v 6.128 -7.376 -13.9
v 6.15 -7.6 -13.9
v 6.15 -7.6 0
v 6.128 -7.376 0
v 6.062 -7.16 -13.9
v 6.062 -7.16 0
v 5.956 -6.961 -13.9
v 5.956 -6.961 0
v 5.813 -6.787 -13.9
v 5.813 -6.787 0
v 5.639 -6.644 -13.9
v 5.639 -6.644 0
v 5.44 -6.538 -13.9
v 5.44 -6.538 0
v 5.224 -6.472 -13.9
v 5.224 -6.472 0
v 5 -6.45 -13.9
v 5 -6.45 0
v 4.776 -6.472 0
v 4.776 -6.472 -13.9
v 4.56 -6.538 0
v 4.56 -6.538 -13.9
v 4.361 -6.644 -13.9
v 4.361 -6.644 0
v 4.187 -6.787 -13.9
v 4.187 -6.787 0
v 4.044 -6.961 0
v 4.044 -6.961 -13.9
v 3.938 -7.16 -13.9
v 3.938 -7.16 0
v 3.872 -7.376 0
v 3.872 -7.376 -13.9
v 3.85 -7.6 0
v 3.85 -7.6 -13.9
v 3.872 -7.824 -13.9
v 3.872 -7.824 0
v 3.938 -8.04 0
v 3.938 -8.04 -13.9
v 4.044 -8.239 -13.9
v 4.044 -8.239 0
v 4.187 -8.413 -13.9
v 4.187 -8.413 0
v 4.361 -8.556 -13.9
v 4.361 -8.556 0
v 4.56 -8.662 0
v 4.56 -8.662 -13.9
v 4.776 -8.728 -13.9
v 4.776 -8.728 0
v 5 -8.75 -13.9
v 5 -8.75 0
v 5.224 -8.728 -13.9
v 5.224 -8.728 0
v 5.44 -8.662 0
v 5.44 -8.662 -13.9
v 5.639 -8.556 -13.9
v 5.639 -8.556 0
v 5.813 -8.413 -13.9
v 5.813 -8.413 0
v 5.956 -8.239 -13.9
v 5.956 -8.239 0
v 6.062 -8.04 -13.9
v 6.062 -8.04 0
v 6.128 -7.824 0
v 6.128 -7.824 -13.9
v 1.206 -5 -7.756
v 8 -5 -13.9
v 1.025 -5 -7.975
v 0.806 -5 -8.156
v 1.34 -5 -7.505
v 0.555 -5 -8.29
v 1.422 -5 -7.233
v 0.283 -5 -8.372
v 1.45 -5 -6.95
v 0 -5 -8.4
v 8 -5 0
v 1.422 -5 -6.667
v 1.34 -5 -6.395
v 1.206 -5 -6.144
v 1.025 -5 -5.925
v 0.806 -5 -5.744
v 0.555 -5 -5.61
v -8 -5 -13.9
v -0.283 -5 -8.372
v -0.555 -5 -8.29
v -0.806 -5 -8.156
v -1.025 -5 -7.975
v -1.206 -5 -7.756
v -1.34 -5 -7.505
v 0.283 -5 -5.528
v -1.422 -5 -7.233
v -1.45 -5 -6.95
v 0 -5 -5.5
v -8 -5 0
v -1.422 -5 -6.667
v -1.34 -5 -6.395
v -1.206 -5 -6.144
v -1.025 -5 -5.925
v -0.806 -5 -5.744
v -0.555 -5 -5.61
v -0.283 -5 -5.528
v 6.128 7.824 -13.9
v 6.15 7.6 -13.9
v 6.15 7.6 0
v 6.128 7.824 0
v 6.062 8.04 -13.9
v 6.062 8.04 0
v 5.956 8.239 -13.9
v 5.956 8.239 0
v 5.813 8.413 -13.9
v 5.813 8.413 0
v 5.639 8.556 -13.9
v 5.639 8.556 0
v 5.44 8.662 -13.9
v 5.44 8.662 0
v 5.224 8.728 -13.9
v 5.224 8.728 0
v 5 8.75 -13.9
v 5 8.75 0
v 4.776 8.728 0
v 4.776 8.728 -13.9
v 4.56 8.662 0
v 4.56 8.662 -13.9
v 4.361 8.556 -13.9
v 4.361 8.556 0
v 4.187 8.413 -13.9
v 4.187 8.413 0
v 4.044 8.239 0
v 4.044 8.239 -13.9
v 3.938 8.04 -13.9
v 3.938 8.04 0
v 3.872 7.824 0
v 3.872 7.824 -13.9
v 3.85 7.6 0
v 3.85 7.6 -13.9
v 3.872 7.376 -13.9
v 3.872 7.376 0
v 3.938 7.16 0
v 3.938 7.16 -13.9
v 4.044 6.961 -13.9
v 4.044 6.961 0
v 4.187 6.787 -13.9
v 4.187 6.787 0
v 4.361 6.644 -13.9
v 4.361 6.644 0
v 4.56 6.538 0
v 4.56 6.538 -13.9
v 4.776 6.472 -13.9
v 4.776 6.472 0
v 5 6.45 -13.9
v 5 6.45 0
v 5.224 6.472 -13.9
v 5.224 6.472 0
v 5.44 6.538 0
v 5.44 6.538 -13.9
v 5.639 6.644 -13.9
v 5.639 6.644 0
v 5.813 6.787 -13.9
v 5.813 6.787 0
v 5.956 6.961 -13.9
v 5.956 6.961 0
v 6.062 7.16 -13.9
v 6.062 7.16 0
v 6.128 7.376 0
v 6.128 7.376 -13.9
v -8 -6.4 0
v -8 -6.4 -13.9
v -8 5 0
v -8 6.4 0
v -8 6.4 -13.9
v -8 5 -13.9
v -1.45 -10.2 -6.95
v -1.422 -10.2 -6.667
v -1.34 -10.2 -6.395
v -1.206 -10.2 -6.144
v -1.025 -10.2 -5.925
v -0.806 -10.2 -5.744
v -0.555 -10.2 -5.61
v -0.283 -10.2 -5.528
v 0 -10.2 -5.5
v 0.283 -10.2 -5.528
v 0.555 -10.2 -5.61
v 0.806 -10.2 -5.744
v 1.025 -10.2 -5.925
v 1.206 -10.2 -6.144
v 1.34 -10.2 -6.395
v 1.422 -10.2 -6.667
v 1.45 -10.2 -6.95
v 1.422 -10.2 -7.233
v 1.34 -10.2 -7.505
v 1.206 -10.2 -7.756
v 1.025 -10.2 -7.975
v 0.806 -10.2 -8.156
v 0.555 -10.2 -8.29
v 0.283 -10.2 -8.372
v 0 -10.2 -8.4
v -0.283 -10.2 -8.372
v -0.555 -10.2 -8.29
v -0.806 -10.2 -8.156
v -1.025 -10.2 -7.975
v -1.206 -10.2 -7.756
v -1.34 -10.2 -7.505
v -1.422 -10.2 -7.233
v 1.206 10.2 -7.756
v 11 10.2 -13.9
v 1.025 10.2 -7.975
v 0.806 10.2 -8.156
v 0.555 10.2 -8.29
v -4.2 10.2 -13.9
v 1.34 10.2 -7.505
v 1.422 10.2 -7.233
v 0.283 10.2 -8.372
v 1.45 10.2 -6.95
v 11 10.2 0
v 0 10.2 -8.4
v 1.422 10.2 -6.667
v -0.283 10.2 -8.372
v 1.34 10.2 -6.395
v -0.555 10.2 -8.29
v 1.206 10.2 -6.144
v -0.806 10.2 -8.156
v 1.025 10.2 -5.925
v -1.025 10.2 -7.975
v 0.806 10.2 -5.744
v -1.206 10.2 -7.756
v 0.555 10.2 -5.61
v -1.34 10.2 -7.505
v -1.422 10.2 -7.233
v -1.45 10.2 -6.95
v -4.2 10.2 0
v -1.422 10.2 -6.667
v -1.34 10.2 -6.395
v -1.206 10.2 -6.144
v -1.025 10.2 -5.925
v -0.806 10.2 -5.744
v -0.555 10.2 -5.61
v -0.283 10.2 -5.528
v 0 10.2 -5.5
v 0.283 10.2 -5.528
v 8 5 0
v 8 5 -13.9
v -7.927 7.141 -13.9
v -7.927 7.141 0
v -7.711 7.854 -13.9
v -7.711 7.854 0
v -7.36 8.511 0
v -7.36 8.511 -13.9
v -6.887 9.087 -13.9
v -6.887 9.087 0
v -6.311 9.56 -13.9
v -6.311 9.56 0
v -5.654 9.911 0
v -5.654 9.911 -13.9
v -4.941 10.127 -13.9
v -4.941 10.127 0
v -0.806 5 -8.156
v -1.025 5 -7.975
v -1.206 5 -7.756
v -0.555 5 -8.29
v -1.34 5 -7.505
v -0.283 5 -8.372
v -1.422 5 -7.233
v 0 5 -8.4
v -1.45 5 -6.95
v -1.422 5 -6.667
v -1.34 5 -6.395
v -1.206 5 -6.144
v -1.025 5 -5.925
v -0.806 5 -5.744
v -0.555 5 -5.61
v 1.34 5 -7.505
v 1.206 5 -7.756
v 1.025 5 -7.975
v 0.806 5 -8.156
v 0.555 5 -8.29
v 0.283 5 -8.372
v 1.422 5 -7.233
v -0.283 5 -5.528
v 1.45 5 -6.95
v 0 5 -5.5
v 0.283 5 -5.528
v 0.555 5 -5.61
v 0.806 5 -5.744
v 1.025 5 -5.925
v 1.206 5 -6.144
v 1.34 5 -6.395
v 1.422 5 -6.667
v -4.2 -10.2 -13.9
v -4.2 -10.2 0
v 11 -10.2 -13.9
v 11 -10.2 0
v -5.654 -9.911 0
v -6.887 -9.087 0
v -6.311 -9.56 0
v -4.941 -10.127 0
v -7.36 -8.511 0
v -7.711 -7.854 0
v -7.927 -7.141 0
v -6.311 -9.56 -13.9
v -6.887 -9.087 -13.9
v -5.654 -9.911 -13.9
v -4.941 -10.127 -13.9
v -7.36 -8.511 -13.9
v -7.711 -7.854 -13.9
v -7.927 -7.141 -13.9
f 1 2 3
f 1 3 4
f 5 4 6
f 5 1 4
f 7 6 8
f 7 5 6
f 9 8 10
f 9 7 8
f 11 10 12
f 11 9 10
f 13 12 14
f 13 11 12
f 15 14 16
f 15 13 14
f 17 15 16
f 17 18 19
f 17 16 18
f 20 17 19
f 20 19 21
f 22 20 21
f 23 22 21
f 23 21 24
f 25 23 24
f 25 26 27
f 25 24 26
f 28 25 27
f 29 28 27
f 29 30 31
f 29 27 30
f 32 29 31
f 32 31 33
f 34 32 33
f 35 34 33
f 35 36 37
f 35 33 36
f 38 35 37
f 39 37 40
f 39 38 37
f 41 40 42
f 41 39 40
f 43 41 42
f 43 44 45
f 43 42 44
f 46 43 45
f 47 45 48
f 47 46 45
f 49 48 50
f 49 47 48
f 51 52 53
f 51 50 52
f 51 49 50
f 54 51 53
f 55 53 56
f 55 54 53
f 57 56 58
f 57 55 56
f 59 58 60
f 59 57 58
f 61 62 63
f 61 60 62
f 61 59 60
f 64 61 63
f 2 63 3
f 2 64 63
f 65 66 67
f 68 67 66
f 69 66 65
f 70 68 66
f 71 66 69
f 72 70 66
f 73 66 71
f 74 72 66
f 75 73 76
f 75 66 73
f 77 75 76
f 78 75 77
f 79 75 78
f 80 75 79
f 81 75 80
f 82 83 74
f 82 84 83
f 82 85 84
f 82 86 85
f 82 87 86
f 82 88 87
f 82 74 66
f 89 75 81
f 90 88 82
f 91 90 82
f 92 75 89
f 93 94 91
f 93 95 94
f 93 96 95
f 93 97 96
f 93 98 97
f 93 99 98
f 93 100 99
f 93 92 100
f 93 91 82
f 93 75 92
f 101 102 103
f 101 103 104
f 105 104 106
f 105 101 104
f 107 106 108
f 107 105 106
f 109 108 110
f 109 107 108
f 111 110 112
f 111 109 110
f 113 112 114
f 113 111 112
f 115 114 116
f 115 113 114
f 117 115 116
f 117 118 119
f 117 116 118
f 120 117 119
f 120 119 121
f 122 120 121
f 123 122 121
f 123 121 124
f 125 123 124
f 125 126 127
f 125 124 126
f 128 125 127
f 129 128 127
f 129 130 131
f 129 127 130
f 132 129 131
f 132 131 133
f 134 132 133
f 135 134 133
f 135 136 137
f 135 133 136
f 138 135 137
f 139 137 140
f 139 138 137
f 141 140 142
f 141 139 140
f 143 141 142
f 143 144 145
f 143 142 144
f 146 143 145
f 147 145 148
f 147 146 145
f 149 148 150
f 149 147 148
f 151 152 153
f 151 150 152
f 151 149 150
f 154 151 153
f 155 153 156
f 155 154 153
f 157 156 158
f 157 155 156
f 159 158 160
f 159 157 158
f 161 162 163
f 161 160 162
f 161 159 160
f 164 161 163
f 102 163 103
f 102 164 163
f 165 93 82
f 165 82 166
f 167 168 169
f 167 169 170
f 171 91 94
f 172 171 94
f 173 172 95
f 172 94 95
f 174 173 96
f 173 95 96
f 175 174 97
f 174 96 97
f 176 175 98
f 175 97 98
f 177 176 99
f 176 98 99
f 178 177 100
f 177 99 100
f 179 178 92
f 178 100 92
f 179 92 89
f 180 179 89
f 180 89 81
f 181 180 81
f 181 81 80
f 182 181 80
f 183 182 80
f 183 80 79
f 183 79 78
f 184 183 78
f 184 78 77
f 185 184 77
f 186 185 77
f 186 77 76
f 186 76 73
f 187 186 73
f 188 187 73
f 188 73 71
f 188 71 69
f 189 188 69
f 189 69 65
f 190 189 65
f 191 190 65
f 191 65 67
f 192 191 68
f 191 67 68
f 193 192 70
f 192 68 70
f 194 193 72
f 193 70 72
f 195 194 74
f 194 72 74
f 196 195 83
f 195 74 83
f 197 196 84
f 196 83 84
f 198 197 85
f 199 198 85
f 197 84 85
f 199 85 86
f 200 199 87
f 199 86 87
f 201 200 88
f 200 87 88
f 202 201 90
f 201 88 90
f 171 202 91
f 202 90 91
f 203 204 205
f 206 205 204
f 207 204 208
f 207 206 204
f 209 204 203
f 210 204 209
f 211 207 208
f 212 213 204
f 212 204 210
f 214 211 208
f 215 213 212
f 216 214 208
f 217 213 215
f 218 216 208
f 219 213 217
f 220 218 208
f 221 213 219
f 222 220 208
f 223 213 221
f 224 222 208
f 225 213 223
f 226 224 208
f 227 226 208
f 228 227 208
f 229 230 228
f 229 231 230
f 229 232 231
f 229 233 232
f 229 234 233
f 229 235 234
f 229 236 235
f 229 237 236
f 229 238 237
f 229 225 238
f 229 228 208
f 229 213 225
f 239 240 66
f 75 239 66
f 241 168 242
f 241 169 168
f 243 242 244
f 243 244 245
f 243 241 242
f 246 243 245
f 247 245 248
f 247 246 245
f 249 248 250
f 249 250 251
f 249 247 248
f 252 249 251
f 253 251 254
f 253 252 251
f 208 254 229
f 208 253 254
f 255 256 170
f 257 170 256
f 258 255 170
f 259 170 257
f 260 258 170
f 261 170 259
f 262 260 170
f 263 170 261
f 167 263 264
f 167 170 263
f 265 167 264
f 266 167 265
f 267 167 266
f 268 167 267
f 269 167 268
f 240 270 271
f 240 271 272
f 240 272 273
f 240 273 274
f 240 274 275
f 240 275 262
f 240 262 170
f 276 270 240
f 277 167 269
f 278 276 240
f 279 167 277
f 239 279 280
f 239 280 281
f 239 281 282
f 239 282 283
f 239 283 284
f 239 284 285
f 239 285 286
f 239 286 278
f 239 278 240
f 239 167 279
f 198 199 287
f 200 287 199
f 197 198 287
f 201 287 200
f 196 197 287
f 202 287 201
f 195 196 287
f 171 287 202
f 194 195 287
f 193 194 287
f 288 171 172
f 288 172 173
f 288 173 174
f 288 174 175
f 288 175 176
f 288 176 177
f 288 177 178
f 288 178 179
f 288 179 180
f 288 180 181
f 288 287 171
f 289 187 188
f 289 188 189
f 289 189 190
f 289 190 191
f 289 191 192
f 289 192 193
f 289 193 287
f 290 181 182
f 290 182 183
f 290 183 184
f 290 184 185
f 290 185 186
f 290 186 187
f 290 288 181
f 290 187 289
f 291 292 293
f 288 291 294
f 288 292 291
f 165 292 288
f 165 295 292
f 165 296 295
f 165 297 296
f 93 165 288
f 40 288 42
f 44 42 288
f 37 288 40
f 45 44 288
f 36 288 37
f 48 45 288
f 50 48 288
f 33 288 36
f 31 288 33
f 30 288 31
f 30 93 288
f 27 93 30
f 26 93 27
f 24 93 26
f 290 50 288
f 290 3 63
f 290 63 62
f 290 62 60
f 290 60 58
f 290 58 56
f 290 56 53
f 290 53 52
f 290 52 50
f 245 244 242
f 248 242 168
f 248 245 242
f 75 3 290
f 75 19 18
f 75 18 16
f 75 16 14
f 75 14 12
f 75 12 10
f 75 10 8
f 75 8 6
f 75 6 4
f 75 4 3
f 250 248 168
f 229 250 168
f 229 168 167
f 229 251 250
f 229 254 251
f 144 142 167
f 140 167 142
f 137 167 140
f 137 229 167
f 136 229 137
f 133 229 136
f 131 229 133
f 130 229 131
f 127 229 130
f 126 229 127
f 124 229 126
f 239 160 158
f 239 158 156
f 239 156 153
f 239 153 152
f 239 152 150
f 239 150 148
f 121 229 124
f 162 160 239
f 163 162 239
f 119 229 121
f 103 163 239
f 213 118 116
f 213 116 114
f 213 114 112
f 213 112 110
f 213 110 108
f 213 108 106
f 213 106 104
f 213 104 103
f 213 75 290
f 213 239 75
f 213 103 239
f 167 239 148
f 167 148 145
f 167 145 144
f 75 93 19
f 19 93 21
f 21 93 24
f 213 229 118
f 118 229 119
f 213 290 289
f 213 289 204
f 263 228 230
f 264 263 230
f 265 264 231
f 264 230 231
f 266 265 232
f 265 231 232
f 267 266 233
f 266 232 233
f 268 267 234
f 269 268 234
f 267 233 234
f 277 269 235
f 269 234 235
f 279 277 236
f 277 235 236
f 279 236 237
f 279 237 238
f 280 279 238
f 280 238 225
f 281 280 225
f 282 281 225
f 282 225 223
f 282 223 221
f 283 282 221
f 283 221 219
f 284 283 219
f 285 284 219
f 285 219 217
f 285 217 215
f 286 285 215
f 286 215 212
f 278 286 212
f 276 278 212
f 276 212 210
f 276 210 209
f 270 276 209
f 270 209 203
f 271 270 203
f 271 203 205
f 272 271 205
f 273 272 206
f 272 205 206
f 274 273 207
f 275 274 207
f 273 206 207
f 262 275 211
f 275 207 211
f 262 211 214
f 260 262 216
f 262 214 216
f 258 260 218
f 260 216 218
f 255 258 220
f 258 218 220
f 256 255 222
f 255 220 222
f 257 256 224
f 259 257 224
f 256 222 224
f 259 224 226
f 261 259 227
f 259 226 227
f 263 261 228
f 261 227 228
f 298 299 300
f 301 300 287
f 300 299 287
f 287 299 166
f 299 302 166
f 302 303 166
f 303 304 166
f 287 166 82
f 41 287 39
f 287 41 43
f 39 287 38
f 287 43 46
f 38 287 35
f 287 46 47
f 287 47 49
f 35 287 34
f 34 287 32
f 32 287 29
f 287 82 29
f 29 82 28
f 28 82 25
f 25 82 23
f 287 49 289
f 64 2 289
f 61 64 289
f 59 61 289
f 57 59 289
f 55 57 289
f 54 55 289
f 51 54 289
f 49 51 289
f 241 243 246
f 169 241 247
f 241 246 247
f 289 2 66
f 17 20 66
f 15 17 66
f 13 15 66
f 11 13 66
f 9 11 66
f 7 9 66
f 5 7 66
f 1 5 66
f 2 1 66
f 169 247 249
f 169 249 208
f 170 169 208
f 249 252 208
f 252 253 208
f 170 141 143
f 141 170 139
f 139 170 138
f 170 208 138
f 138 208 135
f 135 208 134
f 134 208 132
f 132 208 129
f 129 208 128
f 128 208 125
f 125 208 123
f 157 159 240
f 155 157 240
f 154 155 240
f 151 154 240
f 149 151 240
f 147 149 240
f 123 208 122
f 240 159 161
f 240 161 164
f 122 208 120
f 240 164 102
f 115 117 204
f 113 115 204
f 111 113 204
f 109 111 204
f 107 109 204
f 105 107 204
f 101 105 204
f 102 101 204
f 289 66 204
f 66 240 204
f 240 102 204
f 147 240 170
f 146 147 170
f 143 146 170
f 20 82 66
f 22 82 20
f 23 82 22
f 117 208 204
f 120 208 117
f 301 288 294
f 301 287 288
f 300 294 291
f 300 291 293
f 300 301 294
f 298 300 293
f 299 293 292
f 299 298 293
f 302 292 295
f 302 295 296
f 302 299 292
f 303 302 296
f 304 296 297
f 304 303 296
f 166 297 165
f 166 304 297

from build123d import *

# Parameters (mm, degrees)
BOSS_EXTRUDE2_DEPTH     = 13.9
CUT_EXTRUDE1_DEPTH      = 21.451161336
CUT_EXTRUDE1_DEPTH_BACK = 21.451161336
SKETCH2_R               = 1.15
SKETCH3_R               = 1.45
CUT_EXTRUDE2_DEPTH      = 28.025358462
FILLET1_R               = 3.8


with BuildPart() as part:
    # Sketch1 → Boss-Extrude2 (new body)
    with BuildSketch(Plane.XY):
        Polygon((-8, 10.2), (-8, 5), (8, 5), (8, -5), (-8, -5), (-8, -10.2), (11, -10.2), (11, 10.2), align=None)
    extrude(amount=-BOSS_EXTRUDE2_DEPTH)

    # Sketch2 → Cut-Extrude1 (cut, two sides: drawn at the far end of the back side and taken through both)
    with BuildSketch(Plane.XY.offset(-CUT_EXTRUDE1_DEPTH_BACK)):
        with Locations((5, 7.6)):
            Circle(SKETCH2_R)
        with Locations((5, -7.6)):
            Circle(SKETCH2_R)
    extrude(amount=CUT_EXTRUDE1_DEPTH + CUT_EXTRUDE1_DEPTH_BACK, mode=Mode.SUBTRACT)

    # Sketch3 → Cut-Extrude2 (cut, through all)
    with BuildSketch(Plane(origin=(0, 10.2, 0), x_dir=(1, 0, 0), z_dir=(0, 1, 0))):
        with Locations(Location((0, 6.95, 0), (0, 0, 180))):
            Circle(SKETCH3_R)
    extrude(amount=-CUT_EXTRUDE2_DEPTH, mode=Mode.SUBTRACT)

    # Fillet1
    fillet1_edges = [part.edges().sort_by_distance(p)[0] for p in [
        (-8, -10.2, -6.95),
        (-8, 10.2, -6.95),
    ]]
    fillet(fillet1_edges, radius=FILLET1_R)


solid = part.part
